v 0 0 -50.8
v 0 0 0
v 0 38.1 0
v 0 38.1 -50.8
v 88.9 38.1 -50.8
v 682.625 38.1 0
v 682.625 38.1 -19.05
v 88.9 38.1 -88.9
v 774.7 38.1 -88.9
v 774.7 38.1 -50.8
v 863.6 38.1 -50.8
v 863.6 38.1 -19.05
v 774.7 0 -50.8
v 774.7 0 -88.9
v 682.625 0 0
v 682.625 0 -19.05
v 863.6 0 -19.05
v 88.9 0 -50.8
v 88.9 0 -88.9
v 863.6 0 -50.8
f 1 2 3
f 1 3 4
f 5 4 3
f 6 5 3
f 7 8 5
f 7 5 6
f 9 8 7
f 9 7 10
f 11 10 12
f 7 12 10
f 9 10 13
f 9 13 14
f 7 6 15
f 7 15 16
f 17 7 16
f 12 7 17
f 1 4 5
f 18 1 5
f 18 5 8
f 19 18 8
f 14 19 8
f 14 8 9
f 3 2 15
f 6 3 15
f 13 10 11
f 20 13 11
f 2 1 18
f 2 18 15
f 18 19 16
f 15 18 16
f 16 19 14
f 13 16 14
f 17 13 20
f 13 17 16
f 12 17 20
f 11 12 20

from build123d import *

# Parameters (mm, degrees)
SKETCH1_W           = 863.6
SKETCH1_H           = 88.9
BOSS_EXTRUDE1_DEPTH = 38.1
SKETCH3_W           = 88.9
SKETCH3_H           = 38.1
CUT_EXTRUDE1_DEPTH  = 39.1
SKETCH4_W           = 180.975
SKETCH4_H           = 19.05
CUT_EXTRUDE2_DEPTH  = 39.1


with BuildPart() as part:
    # Sketch1 → Boss-Extrude1 (new body)
    with BuildSketch(Plane(origin=(0, 0, 0), x_dir=(1, 0, 0), z_dir=(0, 1, 0))):
        with Locations((431.8, 44.45)):
            Rectangle(SKETCH1_W, SKETCH1_H)
    extrude(amount=BOSS_EXTRUDE1_DEPTH)

    # Sketch3 → Cut-Extrude1 (cut, through all)
    with BuildSketch(Plane(origin=(0, 38.1, 0), x_dir=(1, 0, 0), z_dir=(0, 1, 0))):
        with Locations((44.45, 69.85)):
            Rectangle(SKETCH3_W, SKETCH3_H)
        with Locations((819.15, 69.85)):
            Rectangle(SKETCH3_W, SKETCH3_H)
    extrude(amount=-CUT_EXTRUDE1_DEPTH, mode=Mode.SUBTRACT)

    # Sketch4 → Cut-Extrude2 (cut, through all)
    with BuildSketch(Plane(origin=(0, 38.1, 0), x_dir=(1, 0, 0), z_dir=(0, 1, 0))):
        with Locations((773.1125, 9.525)):
            Rectangle(SKETCH4_W, SKETCH4_H)
    extrude(amount=-CUT_EXTRUDE2_DEPTH, mode=Mode.SUBTRACT)


solid = part.part
